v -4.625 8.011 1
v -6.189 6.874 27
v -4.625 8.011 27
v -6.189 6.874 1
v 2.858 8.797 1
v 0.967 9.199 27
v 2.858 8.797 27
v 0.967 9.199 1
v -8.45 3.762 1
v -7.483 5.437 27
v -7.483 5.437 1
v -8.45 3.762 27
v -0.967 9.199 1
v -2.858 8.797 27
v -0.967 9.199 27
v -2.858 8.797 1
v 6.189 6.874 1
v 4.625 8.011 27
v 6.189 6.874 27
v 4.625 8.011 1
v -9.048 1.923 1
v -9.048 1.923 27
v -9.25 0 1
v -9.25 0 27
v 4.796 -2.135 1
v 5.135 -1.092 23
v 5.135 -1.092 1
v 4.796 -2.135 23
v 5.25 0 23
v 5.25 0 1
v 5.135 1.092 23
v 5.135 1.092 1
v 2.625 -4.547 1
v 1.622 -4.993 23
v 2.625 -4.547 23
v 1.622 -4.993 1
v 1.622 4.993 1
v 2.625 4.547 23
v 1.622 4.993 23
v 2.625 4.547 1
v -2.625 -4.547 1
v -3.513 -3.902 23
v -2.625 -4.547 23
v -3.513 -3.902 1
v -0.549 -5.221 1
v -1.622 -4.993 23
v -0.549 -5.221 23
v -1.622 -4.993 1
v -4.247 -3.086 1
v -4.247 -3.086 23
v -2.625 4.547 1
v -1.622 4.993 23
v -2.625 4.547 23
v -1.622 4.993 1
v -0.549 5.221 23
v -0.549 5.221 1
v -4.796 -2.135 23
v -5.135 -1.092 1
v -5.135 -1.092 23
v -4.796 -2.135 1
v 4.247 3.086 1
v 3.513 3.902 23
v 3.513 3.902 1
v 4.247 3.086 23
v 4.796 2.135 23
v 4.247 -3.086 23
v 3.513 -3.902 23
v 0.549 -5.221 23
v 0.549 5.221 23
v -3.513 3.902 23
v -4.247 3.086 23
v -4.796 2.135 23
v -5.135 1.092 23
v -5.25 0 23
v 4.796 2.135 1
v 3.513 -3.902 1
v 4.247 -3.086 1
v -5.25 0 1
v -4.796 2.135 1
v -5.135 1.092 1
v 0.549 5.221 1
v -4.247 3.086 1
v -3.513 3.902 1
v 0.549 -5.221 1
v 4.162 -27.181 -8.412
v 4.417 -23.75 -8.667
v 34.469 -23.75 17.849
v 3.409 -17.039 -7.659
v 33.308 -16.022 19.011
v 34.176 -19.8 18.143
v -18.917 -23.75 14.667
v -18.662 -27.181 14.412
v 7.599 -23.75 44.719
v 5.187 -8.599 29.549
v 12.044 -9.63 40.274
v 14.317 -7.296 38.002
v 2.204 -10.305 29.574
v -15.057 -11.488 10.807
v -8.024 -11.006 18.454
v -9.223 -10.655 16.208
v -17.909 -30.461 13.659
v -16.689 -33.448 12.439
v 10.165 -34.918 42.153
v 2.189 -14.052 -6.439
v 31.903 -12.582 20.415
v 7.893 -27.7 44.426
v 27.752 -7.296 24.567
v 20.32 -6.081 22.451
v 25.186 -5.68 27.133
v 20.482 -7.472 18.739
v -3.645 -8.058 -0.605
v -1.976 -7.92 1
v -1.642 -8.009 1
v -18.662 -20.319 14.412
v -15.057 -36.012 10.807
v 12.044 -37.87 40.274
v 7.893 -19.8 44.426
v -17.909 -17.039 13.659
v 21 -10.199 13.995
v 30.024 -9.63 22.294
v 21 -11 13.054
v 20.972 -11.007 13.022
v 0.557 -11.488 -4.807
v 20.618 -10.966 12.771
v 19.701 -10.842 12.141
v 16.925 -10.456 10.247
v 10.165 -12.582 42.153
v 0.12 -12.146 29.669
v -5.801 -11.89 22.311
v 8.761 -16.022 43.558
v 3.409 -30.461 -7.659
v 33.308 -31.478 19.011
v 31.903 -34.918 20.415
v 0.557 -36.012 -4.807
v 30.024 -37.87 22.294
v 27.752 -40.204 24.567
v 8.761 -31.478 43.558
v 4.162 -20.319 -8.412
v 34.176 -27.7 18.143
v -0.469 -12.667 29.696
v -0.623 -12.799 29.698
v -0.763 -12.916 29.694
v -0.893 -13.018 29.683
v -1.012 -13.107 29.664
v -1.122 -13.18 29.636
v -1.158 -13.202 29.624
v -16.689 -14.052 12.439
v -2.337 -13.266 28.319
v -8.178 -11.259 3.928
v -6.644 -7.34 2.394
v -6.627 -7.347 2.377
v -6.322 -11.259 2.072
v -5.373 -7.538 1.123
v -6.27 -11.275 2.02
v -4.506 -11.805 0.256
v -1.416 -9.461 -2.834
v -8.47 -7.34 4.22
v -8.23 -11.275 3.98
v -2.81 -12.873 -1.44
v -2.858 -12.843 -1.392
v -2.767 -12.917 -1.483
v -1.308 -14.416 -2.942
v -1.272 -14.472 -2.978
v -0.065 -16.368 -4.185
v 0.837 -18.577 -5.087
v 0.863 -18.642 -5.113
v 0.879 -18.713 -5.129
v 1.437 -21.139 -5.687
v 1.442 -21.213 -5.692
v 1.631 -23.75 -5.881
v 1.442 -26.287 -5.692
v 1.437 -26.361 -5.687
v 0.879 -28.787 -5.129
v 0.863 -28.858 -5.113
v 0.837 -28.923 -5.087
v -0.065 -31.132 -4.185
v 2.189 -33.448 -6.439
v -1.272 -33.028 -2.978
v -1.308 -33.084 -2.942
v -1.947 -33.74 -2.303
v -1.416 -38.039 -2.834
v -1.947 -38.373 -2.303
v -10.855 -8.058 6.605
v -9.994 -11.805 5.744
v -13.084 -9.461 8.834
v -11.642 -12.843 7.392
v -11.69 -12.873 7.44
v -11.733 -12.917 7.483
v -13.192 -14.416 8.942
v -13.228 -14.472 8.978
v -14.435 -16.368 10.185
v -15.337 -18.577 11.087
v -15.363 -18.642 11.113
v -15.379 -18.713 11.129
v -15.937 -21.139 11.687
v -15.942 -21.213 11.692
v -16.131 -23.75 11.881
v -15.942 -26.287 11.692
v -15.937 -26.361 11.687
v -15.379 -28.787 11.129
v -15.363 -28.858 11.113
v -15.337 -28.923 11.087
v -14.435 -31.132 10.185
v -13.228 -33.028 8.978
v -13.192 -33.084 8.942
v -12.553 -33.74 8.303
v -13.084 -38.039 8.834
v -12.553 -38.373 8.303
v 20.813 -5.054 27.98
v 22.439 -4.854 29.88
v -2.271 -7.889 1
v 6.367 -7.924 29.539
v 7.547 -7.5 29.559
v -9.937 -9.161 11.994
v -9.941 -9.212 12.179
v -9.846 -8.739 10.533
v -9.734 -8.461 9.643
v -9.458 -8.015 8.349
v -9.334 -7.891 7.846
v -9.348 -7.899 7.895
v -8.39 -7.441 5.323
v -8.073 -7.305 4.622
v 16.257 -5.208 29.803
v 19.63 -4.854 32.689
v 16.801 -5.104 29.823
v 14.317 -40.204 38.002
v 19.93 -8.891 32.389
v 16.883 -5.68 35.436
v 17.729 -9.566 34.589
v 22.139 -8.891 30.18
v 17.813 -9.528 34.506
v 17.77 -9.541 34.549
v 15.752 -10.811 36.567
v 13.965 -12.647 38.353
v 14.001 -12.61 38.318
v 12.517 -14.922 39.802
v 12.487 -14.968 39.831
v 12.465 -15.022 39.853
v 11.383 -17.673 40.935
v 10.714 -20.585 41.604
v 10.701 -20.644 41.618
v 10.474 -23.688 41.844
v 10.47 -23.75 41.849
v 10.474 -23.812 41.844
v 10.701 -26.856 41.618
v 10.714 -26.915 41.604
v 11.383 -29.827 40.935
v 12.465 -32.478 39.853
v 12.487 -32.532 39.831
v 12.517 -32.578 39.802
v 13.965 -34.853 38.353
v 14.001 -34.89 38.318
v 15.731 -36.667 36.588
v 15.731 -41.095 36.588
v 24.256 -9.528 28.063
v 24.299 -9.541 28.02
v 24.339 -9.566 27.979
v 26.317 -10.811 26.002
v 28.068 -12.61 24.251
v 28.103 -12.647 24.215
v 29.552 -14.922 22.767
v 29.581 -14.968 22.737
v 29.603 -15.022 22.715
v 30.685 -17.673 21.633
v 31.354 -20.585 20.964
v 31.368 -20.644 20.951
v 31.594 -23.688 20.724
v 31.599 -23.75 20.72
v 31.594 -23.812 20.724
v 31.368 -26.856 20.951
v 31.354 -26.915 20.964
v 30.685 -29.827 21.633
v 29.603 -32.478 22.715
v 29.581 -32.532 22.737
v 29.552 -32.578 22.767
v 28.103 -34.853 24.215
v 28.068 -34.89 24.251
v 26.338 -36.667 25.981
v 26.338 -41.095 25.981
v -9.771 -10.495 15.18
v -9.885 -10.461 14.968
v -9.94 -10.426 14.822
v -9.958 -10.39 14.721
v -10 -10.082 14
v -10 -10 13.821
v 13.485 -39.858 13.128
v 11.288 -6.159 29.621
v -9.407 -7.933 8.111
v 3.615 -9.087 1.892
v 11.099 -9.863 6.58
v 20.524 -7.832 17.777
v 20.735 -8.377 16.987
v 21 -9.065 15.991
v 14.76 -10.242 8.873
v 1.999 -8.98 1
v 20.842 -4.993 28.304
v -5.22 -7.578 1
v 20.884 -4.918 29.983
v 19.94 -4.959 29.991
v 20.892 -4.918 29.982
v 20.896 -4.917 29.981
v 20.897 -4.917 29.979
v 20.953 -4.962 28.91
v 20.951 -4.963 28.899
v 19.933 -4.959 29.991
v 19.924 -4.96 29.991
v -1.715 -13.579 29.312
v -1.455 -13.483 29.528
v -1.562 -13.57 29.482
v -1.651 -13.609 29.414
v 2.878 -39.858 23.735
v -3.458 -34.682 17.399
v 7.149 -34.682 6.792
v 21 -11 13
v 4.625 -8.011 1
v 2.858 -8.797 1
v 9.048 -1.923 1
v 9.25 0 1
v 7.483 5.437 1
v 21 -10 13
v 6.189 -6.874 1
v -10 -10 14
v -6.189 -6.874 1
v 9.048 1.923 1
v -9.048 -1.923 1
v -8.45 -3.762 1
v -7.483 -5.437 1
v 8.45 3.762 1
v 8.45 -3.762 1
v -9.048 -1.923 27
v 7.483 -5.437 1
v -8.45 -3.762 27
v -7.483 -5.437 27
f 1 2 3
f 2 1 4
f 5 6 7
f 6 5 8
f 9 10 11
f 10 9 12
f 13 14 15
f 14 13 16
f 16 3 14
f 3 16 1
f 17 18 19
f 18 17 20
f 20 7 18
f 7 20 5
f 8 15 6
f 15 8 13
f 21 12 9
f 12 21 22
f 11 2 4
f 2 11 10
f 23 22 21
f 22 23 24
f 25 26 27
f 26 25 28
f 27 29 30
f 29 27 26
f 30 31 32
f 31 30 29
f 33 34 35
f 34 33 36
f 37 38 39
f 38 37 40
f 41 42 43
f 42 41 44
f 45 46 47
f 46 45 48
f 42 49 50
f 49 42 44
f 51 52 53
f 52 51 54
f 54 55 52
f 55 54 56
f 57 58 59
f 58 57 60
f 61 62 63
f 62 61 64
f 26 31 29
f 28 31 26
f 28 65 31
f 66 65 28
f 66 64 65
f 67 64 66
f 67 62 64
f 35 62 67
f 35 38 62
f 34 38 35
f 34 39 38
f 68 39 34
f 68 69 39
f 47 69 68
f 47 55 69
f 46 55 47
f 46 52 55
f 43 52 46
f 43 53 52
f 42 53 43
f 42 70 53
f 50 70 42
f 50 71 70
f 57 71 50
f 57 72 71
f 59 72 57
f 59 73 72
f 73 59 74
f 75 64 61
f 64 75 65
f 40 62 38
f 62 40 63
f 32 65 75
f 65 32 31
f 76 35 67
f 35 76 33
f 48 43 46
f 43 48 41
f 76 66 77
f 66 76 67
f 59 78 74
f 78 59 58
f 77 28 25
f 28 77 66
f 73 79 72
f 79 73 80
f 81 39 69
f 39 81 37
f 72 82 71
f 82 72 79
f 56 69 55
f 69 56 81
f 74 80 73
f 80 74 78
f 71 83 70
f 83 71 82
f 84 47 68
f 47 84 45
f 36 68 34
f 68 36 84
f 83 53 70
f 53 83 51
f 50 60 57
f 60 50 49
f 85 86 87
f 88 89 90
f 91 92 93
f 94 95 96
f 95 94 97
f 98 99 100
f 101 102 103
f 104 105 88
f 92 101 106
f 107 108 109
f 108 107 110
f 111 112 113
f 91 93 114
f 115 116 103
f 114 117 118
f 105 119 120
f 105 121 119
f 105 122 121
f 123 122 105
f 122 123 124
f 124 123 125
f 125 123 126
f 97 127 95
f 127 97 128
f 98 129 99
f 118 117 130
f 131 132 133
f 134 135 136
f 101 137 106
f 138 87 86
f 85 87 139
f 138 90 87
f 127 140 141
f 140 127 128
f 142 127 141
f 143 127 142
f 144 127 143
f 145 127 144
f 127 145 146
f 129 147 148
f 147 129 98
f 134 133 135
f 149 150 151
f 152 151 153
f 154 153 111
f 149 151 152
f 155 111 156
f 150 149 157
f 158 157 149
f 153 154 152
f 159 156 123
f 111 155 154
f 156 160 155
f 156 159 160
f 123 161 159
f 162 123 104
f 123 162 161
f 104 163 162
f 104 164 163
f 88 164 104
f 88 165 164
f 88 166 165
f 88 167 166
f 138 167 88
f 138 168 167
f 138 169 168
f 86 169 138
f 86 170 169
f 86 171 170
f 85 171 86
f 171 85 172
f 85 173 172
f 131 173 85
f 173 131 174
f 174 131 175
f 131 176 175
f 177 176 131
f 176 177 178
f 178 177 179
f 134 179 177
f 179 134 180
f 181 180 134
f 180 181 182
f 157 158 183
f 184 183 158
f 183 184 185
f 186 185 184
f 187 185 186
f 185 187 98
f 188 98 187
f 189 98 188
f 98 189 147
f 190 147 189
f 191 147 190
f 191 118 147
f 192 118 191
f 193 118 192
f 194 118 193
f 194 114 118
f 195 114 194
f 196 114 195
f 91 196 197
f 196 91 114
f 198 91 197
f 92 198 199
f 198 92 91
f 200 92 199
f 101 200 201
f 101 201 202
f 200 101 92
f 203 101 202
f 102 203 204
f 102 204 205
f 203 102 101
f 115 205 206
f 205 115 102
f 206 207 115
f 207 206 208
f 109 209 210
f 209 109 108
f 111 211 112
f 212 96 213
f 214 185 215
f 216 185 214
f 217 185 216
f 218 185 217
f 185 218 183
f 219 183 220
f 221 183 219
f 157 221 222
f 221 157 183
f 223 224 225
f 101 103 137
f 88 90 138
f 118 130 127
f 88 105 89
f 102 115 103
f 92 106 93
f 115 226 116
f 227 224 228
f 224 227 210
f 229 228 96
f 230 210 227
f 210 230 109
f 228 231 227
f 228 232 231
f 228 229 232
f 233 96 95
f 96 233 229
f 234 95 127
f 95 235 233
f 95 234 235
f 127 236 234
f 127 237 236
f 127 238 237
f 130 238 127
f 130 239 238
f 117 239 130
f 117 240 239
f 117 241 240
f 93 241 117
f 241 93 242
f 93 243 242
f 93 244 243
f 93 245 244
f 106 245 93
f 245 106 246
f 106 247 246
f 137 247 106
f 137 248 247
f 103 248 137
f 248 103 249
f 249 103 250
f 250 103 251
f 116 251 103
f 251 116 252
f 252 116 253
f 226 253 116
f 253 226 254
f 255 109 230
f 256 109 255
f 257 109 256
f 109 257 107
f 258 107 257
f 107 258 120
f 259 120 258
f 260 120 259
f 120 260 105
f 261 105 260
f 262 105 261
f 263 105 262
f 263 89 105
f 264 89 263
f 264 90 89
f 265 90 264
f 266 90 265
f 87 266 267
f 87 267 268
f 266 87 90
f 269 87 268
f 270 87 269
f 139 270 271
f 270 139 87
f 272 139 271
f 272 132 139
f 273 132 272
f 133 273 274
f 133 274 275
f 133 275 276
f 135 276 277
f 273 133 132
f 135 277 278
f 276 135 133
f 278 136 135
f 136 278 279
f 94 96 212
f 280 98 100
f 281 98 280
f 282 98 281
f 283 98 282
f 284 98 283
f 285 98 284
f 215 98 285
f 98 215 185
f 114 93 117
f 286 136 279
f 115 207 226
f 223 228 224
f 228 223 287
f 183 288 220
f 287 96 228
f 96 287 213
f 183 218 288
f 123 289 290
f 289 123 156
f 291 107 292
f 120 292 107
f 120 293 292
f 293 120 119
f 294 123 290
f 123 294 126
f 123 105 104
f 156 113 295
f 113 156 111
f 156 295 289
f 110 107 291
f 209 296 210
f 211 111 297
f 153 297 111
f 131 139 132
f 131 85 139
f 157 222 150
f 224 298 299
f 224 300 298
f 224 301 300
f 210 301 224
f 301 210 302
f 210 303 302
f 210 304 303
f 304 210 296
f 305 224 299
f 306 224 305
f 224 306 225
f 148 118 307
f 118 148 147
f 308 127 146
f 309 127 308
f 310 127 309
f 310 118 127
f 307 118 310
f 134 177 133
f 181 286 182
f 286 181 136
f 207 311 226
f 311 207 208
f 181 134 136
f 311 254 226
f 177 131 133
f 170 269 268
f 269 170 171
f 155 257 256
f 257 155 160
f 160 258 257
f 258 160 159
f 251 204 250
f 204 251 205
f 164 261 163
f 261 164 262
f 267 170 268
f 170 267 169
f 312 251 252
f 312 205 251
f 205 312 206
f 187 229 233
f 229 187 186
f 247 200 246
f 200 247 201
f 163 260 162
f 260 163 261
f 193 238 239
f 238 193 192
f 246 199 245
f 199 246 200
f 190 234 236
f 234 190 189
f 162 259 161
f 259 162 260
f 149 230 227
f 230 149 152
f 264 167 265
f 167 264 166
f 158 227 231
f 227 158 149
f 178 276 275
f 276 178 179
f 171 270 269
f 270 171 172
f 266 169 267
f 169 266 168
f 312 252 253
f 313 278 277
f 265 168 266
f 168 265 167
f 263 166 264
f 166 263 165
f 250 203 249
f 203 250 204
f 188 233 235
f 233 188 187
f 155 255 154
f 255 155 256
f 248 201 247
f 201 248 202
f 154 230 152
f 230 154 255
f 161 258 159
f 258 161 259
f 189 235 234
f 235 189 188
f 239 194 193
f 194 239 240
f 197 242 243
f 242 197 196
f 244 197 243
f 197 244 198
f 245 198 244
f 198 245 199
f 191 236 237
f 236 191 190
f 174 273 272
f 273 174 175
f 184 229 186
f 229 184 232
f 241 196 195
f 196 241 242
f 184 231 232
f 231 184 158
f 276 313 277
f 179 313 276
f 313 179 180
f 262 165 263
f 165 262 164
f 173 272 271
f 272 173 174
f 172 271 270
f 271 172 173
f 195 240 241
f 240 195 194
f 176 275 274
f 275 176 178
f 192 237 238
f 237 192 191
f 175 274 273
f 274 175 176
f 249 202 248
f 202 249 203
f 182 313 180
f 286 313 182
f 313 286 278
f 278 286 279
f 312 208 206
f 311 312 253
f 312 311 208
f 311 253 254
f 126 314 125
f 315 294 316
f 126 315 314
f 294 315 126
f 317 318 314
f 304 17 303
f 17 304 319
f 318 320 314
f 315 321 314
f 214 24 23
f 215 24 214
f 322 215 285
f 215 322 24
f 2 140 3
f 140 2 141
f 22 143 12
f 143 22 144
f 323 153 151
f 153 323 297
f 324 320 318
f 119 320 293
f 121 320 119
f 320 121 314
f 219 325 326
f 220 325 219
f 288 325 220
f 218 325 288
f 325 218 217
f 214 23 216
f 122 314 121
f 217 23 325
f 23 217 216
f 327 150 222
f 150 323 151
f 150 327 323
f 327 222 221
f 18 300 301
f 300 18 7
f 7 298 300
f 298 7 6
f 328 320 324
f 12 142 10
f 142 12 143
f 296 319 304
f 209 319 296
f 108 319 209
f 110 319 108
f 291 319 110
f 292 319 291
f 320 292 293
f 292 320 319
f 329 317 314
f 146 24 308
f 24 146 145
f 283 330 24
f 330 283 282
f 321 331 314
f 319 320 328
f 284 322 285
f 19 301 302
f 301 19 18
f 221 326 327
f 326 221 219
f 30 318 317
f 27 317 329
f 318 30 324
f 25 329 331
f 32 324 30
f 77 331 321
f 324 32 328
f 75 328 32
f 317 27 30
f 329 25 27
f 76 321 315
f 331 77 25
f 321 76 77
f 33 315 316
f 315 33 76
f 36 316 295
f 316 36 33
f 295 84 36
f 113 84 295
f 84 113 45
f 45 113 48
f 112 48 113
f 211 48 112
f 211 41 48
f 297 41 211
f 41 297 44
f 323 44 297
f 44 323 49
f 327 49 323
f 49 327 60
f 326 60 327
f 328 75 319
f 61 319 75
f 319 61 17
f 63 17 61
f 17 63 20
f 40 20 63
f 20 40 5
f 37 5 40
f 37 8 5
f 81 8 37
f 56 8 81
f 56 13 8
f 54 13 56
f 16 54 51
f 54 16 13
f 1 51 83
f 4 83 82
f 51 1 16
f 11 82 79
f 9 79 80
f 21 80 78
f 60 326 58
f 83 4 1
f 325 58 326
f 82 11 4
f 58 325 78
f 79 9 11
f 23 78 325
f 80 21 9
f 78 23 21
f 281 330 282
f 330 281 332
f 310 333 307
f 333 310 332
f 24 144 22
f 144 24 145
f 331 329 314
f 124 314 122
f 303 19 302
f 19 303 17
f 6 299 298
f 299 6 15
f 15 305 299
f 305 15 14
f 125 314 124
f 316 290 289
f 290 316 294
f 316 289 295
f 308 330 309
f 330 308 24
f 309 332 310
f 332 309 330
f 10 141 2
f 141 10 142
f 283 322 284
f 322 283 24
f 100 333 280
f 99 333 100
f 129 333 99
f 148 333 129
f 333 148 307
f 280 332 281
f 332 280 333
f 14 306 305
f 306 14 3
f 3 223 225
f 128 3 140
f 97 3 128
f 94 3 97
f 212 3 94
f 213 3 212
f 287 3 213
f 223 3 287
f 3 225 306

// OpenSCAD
plug_dia = 10.5;
plug_length = 20.0;
plug_len_add = 2;

// use 4 for holder, 2 for adapter
plug_wall = 4.0; //2.0;

shower_wall = 4.0;
shower_dia_min = 25;//31.0;
shower_dia_max = 30;//35.0;
shower_length = 40.0;
shower_cut = 15.0;
shower_angle = 45;

plate_width = 20;
plate_hole = 8.5;
bolt_dia = 8.0;
bolt_len = 33;

knob_dia = 15.0;
knob_height = 4.0;
nut_dia = 15.0;
nut_height = 8.0;

$fn = 30;

include <threads.scad>;

module plug() {
    difference() {
        cylinder(d = plug_dia + plug_wall * 2, h = plug_length + plug_wall);
        
        translate([0, 0, -1])
        cylinder(d = plug_dia, h = plug_length + 1);
    }
}

module shower() {
    difference() {
        cylinder(d1 = shower_dia_min + shower_wall * 2, d2 = shower_dia_max + shower_wall * 2, h = shower_length);
        
        translate([0, 0, -1])
        cylinder(d1 = shower_dia_min, d2 = shower_dia_max, h = shower_length + 2);
        
        translate([-shower_cut / 2, 0, -1])
        cube([shower_cut, shower_dia_max, shower_length + 2]);
    }
}

module holder() {
    plug();
    
    translate([-(plug_dia + plug_wall) / 2, shower_dia_min / 2 + shower_wall + (plug_dia + plug_wall) / 2, 0])
    rotate([0, shower_angle, 0])
    shower();
    
    difference() {
        hull() {
            translate([0, 0, -plug_len_add])
            cylinder(d = plug_dia + plug_wall * 2, h = 1);
            
            translate([0, 0, plug_length + plug_wall - 1])
            cylinder(d = plug_dia + plug_wall * 2, h = 1);
        
            translate([0, 15, 26])
            cube([1, 1, 1]);
            translate([-10, 10, 10])
            cube([1, 1, 1]);
            translate([20, 5, 26])
            cube([1, 1, 1]);
            translate([20, 10, 10])
            cube([1, 1, 1]);
        }
        
        translate([0, 0, -plug_len_add - 1])
        cylinder(d = plug_dia, h = plug_length + plug_len_add + 1);
        
        translate([-(plug_dia + plug_wall) / 2, shower_dia_min / 2 + shower_wall + (plug_dia + plug_wall) / 2, 0])
        rotate([0, shower_angle, 0])
        translate([0, 0, -1])
        cylinder(d1 = shower_dia_min, d2 = shower_dia_max, h = shower_length + 2);
    }
}

module adapter_a() {
    difference() {
        union() {
            hull() {
                cylinder(d = plug_dia - 0.3, h = plug_wall);
                
                translate([-plate_width / 2, plug_dia / 2, -plate_width])
                cube([plate_width, plug_wall, plate_width]);
            }
        
            translate([0, plug_wall + plug_dia / 2, -plate_width / 2])
            rotate([90, 0, 0])
            cylinder(d = plate_hole + 5, h = 11);
        }
        
        translate([0, plug_wall + 8 + plug_dia / 2, -plate_width / 2])
        rotate([90, 0, 0])
        cylinder(d = plate_hole, h = plate_width);
    }
    
    translate([0, 0, plug_wall])
    cylinder(d = plug_dia - 0.3, h = plug_length);
}

module adapter_b() {
    difference() {
        union() {
            hull() {
                translate([0, 0, plug_length + plug_wall])
                rotate([180, 0, 0])
                plug();
                
                translate([-plate_width / 2, plug_dia / 2, -plate_width])
                cube([plate_width, plug_wall, plate_width]);
            }
        
            translate([0, plug_wall + plug_dia / 2, -plate_width / 2])
            rotate([90, 0, 0])
            cylinder(d = plate_hole + 5, h = 13);
        }
        
        translate([0, plug_wall + 6 + plug_dia / 2, -plate_width / 2])
        rotate([90, 0, 0])
        cylinder(d = plate_hole, h = plate_width);
        
        translate([0, 0, plug_wall])
        cylinder(d = plug_dia, h = plug_length + 1);
    }
}

module thread(length, internal) {
    metric_thread(diameter=bolt_dia, pitch=2.54,
        length=length, internal=internal, n_starts=1,
        thread_size=-1, angle=40, leadin=1, leadfac=1.5);
    
    //cylinder(d = bolt_dia, h = length);
}

module bolt() {
    cylinder(d = knob_dia, h = knob_height, $fn = 12);
    
    translate([0, 0, knob_height])
    thread(bolt_len, false);
}

module nut() {
    difference() {
        cylinder(d = nut_dia, h = nut_height, $fn = 12);
        
        translate([0, 0, -0.1])
        thread(nut_height + 0.2, true);
    }
}


translate([0, 0, 3])
scale([1, -1, 1])
holder();

/*
translate([0, 0, -30]) {
    adapter_a();

    translate([0, 15, -plate_width])
    rotate([0, 180, 180])
    adapter_b();


    //translate([0, -8, -10])
    //rotate([90, 0, 180])
    //bolt();

    //translate([0, 29, -10])
    //rotate([90, 0, 0])
    //nut();
}
*/
